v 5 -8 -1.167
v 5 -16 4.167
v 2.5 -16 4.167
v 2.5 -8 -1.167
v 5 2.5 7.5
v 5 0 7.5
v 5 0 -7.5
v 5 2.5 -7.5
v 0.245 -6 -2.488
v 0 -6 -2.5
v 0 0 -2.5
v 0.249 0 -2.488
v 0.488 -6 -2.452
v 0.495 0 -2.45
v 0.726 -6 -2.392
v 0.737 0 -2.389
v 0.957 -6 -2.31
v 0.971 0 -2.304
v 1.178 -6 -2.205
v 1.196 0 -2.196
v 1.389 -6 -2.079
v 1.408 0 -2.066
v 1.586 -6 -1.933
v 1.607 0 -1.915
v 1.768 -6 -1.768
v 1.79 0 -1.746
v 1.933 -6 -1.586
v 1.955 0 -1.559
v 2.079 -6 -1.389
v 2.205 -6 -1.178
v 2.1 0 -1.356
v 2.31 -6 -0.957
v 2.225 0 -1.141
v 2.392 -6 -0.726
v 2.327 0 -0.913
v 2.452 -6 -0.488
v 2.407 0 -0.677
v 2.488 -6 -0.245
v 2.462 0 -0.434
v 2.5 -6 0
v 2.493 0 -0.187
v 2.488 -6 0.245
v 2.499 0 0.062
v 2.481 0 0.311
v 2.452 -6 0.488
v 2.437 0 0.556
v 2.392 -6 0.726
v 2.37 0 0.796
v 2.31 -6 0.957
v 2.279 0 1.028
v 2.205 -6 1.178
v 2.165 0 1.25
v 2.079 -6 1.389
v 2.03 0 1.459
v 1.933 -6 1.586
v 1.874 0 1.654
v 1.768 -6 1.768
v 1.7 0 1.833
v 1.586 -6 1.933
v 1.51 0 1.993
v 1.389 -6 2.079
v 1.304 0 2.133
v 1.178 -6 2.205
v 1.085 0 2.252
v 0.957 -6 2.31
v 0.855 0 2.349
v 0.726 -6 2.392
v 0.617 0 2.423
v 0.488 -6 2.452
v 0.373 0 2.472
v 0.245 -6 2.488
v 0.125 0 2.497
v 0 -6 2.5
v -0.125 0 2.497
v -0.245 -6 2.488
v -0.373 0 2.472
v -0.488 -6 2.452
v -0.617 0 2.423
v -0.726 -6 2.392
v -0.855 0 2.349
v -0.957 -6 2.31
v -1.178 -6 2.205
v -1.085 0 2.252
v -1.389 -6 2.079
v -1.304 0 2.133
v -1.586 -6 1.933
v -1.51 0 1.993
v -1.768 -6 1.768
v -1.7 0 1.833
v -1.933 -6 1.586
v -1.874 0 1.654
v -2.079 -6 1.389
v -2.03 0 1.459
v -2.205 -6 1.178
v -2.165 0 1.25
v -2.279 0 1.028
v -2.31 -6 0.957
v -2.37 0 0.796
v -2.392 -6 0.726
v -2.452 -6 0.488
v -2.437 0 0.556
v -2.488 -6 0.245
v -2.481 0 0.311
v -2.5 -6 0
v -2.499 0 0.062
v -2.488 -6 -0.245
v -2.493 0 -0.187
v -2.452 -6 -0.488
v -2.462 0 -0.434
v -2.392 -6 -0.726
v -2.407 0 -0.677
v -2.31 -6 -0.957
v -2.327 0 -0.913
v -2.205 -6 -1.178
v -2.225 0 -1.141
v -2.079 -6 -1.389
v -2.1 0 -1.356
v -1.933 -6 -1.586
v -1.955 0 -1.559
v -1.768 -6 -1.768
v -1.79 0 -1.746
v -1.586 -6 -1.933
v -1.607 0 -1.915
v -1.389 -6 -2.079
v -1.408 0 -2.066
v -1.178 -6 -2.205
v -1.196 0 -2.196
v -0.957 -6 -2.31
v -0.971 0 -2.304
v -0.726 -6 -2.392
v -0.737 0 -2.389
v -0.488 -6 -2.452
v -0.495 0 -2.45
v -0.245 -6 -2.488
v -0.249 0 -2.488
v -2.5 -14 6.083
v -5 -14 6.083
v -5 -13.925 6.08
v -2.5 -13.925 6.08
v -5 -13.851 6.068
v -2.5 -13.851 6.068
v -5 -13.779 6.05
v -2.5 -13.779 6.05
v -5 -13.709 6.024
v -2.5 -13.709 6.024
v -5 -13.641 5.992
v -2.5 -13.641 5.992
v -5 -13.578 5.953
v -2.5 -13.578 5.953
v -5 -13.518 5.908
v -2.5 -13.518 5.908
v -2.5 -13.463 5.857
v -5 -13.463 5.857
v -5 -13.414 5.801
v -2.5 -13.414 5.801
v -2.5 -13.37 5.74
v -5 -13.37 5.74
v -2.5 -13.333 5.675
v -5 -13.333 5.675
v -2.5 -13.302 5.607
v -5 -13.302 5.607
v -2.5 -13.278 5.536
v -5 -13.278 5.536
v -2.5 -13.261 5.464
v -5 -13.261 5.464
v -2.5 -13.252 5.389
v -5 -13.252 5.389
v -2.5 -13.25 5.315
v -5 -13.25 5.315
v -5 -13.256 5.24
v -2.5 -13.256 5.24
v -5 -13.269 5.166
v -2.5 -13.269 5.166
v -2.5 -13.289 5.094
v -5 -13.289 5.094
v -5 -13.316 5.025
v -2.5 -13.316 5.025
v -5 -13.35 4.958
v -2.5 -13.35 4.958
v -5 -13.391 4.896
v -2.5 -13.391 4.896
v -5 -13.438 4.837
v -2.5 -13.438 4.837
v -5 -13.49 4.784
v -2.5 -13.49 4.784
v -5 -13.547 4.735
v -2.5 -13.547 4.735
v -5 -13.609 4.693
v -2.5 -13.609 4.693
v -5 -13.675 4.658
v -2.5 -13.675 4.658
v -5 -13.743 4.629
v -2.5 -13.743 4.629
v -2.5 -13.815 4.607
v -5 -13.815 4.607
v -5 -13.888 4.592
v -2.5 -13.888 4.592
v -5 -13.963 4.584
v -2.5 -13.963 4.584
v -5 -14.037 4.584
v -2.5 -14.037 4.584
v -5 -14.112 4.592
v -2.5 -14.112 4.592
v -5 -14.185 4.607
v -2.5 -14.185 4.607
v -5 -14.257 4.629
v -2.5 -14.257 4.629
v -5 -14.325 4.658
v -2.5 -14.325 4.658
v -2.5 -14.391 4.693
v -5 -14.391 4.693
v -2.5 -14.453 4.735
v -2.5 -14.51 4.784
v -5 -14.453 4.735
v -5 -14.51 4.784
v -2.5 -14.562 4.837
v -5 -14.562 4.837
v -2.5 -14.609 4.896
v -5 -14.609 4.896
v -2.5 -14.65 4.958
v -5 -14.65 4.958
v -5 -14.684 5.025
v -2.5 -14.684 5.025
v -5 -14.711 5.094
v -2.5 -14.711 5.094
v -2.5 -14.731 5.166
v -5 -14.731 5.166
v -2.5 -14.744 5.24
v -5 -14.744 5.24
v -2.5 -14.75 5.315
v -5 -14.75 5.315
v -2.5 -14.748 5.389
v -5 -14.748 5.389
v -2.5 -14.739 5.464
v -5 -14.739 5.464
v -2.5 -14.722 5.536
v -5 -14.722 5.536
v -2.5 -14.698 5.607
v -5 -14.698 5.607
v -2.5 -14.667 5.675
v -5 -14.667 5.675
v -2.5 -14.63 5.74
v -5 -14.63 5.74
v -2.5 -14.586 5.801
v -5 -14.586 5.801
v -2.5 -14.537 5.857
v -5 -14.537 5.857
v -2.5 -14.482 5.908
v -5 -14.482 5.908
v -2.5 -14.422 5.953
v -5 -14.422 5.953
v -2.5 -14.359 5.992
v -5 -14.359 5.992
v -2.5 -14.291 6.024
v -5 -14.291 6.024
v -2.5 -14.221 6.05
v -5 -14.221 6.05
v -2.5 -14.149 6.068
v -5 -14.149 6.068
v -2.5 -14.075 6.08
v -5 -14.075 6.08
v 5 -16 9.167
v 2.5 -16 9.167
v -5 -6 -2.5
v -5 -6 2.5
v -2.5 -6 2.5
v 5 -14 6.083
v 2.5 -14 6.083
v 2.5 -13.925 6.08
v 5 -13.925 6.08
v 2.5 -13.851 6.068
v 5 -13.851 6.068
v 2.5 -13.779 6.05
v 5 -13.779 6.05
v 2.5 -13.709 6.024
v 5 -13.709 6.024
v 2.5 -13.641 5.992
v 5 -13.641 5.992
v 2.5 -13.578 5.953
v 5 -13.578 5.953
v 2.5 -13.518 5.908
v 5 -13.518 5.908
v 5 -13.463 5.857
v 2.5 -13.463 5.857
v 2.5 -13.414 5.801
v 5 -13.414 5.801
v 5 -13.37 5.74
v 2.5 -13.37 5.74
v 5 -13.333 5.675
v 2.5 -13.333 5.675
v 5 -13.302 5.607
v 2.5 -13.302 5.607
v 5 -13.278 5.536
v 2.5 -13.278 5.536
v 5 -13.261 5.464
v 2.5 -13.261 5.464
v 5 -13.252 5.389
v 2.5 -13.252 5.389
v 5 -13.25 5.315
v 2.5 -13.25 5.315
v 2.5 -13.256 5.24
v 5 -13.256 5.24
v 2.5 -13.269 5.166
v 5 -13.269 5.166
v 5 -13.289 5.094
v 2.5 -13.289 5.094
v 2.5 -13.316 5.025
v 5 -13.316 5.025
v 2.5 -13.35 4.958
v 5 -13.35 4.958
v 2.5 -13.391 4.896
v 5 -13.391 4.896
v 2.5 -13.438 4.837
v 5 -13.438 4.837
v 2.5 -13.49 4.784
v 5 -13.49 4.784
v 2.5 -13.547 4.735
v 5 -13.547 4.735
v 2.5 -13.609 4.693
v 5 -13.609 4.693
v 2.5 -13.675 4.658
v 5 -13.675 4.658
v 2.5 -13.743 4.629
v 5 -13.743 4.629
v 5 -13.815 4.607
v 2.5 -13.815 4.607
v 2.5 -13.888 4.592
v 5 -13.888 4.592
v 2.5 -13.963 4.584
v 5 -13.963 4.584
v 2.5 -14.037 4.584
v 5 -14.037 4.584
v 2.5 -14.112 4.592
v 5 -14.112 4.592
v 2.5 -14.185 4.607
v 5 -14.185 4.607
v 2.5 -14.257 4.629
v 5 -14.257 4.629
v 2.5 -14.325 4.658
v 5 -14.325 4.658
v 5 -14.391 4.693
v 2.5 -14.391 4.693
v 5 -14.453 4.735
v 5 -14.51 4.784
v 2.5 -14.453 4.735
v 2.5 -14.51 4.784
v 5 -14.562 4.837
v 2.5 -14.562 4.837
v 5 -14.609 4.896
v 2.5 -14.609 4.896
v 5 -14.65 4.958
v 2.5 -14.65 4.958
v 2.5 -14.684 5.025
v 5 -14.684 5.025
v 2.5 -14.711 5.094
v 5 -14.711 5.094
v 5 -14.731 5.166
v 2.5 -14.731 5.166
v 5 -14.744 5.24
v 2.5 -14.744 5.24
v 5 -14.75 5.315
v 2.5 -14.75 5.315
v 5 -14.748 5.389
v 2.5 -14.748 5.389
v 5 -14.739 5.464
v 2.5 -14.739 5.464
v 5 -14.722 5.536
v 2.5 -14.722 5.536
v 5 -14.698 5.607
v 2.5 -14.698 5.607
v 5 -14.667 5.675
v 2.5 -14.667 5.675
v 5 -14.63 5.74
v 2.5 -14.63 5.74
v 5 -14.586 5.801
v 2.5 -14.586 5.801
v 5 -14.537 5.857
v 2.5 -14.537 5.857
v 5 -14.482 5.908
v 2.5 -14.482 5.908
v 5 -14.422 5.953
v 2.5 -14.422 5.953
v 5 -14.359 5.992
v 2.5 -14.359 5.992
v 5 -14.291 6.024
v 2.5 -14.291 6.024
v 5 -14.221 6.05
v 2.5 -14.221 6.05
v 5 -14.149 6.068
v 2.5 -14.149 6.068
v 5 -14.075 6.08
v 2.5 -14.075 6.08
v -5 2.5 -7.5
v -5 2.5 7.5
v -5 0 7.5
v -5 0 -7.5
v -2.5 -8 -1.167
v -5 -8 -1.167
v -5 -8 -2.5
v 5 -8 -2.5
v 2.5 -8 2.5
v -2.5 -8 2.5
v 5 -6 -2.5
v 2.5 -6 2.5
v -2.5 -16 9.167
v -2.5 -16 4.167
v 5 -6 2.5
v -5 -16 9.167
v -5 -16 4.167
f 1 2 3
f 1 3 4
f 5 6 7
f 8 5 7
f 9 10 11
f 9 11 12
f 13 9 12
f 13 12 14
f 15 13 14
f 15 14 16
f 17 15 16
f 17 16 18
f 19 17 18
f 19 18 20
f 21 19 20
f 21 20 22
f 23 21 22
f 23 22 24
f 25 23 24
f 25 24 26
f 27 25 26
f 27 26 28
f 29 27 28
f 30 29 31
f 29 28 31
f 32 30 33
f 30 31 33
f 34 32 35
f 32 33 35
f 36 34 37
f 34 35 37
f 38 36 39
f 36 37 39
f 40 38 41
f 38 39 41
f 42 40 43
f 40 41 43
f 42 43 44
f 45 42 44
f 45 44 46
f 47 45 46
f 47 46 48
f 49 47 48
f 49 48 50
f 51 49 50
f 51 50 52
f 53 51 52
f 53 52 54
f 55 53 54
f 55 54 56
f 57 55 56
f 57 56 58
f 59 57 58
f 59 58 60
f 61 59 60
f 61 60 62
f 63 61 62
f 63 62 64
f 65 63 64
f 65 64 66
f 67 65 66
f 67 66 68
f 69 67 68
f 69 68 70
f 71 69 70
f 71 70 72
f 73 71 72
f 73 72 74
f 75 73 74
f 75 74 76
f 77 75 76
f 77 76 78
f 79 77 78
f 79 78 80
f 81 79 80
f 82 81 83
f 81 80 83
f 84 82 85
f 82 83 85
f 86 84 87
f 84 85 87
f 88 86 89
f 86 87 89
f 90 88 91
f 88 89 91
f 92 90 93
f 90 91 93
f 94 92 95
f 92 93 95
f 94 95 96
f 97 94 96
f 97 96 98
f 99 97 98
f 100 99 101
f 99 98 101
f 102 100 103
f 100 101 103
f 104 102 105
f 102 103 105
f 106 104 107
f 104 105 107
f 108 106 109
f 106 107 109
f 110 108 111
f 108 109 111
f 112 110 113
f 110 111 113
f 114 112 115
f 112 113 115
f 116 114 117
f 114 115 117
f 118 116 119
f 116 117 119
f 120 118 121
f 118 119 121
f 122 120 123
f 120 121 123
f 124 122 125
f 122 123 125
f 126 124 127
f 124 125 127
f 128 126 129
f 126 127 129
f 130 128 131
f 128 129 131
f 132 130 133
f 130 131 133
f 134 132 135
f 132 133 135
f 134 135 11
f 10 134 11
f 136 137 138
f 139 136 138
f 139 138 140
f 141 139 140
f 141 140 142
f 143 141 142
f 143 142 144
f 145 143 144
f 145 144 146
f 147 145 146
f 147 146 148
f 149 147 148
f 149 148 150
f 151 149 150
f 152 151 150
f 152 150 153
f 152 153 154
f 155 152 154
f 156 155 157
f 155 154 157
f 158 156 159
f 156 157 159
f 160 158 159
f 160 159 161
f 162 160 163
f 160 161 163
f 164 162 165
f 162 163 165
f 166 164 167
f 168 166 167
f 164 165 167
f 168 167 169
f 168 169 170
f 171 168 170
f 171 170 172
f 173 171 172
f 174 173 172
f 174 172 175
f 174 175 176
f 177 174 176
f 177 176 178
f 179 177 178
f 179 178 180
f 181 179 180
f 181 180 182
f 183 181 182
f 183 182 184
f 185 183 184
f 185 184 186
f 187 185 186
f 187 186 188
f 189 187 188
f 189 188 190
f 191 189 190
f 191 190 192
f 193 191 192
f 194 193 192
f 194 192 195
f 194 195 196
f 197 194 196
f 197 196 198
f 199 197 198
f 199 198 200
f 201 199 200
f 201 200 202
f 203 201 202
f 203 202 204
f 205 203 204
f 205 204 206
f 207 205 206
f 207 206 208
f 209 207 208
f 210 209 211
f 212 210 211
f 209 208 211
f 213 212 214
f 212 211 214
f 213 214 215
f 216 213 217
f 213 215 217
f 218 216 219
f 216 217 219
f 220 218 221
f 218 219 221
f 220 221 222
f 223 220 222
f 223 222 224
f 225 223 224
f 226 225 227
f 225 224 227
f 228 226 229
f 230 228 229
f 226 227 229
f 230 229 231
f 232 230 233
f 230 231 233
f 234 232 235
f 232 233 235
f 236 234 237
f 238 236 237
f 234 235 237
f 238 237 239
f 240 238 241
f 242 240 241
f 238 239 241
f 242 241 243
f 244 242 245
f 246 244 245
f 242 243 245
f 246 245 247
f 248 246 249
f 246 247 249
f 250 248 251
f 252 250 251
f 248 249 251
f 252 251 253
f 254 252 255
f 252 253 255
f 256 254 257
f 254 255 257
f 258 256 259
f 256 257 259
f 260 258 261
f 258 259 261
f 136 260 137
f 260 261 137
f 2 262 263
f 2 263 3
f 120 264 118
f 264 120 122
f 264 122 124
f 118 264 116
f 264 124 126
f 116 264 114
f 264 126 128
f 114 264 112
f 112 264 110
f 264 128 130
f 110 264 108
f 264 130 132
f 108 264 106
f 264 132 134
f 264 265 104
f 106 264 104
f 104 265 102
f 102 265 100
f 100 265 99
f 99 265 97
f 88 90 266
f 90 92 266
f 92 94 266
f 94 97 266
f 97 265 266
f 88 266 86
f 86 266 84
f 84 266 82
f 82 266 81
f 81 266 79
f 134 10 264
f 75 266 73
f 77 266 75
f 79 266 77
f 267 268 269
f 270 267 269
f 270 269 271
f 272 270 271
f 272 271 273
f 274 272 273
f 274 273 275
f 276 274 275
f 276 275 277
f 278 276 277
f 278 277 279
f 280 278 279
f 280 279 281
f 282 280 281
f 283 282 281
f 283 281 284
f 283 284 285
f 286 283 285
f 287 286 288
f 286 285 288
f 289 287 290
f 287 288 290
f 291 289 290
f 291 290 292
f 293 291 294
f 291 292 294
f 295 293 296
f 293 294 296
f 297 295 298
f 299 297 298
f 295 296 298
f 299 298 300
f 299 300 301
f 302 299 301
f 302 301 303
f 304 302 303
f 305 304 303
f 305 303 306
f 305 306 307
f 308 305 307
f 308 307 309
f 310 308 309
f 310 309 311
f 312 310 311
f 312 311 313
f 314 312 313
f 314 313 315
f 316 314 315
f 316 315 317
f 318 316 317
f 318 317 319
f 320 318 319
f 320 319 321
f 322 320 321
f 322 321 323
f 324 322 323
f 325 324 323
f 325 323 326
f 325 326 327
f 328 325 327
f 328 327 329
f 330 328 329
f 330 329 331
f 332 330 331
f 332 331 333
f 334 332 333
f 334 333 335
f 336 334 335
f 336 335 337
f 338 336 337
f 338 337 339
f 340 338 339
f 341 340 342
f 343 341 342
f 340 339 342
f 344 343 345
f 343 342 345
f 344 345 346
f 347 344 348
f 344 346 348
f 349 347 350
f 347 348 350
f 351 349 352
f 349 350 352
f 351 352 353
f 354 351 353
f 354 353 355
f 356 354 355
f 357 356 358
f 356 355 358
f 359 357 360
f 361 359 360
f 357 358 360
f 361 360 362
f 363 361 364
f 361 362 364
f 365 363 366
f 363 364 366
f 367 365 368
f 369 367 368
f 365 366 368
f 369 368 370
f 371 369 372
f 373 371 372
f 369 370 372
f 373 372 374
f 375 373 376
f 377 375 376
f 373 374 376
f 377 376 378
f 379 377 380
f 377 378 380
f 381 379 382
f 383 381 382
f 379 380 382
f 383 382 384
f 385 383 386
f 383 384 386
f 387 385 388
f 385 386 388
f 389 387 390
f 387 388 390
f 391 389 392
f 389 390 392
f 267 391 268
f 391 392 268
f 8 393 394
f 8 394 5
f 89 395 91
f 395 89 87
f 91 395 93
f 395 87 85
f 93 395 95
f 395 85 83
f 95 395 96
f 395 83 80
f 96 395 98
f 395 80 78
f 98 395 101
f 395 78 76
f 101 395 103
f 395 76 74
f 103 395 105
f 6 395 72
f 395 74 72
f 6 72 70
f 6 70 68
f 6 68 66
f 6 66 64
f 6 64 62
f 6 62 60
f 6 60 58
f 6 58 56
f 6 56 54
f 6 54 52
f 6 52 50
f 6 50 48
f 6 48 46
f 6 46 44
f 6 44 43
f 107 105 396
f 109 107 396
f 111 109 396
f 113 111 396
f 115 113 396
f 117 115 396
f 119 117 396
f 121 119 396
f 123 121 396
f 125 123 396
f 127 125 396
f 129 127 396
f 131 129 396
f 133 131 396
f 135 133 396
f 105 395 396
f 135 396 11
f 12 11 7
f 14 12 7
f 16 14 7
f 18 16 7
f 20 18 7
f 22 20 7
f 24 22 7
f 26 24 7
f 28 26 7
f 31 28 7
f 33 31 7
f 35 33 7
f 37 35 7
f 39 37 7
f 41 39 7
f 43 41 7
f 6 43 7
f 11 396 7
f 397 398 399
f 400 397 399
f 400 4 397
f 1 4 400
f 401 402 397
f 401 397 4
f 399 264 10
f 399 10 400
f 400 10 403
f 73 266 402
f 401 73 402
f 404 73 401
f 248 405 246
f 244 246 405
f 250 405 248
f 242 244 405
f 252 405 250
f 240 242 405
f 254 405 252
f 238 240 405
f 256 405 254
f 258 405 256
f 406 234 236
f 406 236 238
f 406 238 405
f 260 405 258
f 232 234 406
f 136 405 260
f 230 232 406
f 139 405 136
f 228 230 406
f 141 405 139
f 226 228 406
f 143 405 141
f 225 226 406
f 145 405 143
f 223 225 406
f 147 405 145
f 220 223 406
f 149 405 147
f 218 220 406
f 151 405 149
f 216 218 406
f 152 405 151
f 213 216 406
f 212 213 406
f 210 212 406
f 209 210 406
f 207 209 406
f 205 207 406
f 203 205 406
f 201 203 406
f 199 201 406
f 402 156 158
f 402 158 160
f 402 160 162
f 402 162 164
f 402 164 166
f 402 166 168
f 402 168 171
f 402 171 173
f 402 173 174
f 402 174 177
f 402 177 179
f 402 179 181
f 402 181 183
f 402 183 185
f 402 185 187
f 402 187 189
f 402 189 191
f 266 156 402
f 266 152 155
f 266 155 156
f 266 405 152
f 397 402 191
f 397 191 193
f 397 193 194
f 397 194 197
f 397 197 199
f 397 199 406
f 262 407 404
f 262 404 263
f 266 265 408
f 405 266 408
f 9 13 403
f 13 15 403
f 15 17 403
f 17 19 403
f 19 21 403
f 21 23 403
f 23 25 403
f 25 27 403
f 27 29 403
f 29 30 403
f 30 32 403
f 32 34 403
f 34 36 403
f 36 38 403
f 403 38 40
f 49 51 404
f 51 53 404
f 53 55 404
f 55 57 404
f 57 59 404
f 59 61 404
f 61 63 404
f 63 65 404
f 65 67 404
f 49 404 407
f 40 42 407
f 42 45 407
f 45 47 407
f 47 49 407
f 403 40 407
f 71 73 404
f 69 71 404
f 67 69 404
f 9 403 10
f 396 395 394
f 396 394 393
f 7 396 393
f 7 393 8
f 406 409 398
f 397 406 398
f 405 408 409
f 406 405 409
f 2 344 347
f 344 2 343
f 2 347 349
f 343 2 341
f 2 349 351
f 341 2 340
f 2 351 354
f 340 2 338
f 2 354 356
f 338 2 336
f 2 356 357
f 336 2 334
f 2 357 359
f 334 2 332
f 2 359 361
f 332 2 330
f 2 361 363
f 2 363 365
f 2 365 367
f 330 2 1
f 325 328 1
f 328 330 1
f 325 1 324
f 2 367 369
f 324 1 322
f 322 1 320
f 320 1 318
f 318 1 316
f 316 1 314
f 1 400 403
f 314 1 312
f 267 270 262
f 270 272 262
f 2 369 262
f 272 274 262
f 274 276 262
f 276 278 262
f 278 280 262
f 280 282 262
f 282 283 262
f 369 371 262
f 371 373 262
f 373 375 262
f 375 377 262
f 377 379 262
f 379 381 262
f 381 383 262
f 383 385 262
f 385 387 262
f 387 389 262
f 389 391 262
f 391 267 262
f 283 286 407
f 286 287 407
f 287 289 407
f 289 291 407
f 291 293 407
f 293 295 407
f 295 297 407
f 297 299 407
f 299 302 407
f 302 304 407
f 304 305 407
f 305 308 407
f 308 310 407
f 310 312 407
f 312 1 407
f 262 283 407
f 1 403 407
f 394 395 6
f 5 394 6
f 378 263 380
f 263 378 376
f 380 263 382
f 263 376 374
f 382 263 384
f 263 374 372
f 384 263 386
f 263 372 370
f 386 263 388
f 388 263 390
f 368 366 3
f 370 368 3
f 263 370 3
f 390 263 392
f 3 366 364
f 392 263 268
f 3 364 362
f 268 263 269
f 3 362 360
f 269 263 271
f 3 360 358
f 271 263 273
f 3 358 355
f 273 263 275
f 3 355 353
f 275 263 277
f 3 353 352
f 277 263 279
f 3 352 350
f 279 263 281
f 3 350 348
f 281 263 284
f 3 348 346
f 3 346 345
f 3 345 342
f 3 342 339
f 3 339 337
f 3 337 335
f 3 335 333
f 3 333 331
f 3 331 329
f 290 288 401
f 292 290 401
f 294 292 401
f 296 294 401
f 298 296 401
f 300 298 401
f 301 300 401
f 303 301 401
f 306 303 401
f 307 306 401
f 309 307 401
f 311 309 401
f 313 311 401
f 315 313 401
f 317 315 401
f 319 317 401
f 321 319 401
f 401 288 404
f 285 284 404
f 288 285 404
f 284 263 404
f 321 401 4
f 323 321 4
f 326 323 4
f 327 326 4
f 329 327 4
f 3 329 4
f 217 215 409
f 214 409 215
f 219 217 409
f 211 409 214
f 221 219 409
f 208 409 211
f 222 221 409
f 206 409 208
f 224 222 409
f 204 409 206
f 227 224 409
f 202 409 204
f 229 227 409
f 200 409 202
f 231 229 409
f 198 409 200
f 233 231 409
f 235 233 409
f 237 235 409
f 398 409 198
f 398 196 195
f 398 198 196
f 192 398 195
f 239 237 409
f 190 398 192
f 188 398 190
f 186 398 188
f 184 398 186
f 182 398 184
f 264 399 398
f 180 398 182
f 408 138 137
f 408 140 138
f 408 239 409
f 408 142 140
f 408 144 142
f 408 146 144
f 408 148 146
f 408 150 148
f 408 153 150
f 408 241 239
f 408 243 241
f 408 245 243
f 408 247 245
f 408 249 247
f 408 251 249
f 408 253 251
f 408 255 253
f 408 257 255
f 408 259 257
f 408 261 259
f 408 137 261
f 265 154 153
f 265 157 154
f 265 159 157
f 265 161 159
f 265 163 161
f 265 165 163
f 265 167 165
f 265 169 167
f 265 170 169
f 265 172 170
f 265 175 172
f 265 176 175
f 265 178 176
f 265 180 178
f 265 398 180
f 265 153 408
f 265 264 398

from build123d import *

# Parameters (mm, degrees)
SKETCH4_W           = 10
SKETCH4_H           = 15
BOSS_EXTRUDE3_DEPTH = 2.5
SKETCH5_R           = 2.5
BOSS_EXTRUDE4_DEPTH = 6
SKETCH6_W           = 10
SKETCH6_H           = 5
BOSS_EXTRUDE5_DEPTH = 2
BOSS_EXTRUDE6_DEPTH = 2.5
BOSS_EXTRUDE7_DEPTH = 2.5
SKETCH9_R           = 0.75
CUT_EXTRUDE1_DEPTH  = 21.97683908


with BuildPart() as part:
    # Sketch4 → Boss-Extrude3 (new body)
    with BuildSketch(Plane(origin=(0, 0, 0), x_dir=(1, 0, 0), z_dir=(0, 1, 0))):
        Rectangle(SKETCH4_W, SKETCH4_H)
    extrude(amount=BOSS_EXTRUDE3_DEPTH)

    # Sketch5 → Boss-Extrude4 (add)
    with BuildSketch(Plane.XZ):
        with Locations(Location((0, 0, 0), (0, 0, 270))):
            Circle(SKETCH5_R)
    extrude(amount=BOSS_EXTRUDE4_DEPTH)

    # Sketch6 → Boss-Extrude5 (add)
    with BuildSketch(Plane.XZ.offset(6)):
        Rectangle(SKETCH6_W, SKETCH6_H)
    extrude(amount=BOSS_EXTRUDE5_DEPTH)

    # Sketch7 → Boss-Extrude6 (add)
    with BuildSketch(Plane.ZY.offset(5)):
        Polygon((-2.5, -6), (2.5, -6), (9.166666667, -16), (4.166666667, -16), align=None)
    extrude(amount=-BOSS_EXTRUDE6_DEPTH)

    # Sketch8 → Boss-Extrude7 (add)
    with BuildSketch(Plane(origin=(5, 0, 0), x_dir=(0, 0, -1), z_dir=(1, 0, 0))):
        Polygon((2.5, -6), (-2.5, -6), (-9.166666667, -16), (-4.166666667, -16), align=None)
    extrude(amount=-BOSS_EXTRUDE7_DEPTH)

    # Sketch9 → Cut-Extrude1 (cut, through all)
    with BuildSketch(Plane.ZY.offset(5)):
        with Locations((5.333333333, -14)):
            Circle(SKETCH9_R)
    extrude(amount=-CUT_EXTRUDE1_DEPTH, mode=Mode.SUBTRACT)


solid = part.part
